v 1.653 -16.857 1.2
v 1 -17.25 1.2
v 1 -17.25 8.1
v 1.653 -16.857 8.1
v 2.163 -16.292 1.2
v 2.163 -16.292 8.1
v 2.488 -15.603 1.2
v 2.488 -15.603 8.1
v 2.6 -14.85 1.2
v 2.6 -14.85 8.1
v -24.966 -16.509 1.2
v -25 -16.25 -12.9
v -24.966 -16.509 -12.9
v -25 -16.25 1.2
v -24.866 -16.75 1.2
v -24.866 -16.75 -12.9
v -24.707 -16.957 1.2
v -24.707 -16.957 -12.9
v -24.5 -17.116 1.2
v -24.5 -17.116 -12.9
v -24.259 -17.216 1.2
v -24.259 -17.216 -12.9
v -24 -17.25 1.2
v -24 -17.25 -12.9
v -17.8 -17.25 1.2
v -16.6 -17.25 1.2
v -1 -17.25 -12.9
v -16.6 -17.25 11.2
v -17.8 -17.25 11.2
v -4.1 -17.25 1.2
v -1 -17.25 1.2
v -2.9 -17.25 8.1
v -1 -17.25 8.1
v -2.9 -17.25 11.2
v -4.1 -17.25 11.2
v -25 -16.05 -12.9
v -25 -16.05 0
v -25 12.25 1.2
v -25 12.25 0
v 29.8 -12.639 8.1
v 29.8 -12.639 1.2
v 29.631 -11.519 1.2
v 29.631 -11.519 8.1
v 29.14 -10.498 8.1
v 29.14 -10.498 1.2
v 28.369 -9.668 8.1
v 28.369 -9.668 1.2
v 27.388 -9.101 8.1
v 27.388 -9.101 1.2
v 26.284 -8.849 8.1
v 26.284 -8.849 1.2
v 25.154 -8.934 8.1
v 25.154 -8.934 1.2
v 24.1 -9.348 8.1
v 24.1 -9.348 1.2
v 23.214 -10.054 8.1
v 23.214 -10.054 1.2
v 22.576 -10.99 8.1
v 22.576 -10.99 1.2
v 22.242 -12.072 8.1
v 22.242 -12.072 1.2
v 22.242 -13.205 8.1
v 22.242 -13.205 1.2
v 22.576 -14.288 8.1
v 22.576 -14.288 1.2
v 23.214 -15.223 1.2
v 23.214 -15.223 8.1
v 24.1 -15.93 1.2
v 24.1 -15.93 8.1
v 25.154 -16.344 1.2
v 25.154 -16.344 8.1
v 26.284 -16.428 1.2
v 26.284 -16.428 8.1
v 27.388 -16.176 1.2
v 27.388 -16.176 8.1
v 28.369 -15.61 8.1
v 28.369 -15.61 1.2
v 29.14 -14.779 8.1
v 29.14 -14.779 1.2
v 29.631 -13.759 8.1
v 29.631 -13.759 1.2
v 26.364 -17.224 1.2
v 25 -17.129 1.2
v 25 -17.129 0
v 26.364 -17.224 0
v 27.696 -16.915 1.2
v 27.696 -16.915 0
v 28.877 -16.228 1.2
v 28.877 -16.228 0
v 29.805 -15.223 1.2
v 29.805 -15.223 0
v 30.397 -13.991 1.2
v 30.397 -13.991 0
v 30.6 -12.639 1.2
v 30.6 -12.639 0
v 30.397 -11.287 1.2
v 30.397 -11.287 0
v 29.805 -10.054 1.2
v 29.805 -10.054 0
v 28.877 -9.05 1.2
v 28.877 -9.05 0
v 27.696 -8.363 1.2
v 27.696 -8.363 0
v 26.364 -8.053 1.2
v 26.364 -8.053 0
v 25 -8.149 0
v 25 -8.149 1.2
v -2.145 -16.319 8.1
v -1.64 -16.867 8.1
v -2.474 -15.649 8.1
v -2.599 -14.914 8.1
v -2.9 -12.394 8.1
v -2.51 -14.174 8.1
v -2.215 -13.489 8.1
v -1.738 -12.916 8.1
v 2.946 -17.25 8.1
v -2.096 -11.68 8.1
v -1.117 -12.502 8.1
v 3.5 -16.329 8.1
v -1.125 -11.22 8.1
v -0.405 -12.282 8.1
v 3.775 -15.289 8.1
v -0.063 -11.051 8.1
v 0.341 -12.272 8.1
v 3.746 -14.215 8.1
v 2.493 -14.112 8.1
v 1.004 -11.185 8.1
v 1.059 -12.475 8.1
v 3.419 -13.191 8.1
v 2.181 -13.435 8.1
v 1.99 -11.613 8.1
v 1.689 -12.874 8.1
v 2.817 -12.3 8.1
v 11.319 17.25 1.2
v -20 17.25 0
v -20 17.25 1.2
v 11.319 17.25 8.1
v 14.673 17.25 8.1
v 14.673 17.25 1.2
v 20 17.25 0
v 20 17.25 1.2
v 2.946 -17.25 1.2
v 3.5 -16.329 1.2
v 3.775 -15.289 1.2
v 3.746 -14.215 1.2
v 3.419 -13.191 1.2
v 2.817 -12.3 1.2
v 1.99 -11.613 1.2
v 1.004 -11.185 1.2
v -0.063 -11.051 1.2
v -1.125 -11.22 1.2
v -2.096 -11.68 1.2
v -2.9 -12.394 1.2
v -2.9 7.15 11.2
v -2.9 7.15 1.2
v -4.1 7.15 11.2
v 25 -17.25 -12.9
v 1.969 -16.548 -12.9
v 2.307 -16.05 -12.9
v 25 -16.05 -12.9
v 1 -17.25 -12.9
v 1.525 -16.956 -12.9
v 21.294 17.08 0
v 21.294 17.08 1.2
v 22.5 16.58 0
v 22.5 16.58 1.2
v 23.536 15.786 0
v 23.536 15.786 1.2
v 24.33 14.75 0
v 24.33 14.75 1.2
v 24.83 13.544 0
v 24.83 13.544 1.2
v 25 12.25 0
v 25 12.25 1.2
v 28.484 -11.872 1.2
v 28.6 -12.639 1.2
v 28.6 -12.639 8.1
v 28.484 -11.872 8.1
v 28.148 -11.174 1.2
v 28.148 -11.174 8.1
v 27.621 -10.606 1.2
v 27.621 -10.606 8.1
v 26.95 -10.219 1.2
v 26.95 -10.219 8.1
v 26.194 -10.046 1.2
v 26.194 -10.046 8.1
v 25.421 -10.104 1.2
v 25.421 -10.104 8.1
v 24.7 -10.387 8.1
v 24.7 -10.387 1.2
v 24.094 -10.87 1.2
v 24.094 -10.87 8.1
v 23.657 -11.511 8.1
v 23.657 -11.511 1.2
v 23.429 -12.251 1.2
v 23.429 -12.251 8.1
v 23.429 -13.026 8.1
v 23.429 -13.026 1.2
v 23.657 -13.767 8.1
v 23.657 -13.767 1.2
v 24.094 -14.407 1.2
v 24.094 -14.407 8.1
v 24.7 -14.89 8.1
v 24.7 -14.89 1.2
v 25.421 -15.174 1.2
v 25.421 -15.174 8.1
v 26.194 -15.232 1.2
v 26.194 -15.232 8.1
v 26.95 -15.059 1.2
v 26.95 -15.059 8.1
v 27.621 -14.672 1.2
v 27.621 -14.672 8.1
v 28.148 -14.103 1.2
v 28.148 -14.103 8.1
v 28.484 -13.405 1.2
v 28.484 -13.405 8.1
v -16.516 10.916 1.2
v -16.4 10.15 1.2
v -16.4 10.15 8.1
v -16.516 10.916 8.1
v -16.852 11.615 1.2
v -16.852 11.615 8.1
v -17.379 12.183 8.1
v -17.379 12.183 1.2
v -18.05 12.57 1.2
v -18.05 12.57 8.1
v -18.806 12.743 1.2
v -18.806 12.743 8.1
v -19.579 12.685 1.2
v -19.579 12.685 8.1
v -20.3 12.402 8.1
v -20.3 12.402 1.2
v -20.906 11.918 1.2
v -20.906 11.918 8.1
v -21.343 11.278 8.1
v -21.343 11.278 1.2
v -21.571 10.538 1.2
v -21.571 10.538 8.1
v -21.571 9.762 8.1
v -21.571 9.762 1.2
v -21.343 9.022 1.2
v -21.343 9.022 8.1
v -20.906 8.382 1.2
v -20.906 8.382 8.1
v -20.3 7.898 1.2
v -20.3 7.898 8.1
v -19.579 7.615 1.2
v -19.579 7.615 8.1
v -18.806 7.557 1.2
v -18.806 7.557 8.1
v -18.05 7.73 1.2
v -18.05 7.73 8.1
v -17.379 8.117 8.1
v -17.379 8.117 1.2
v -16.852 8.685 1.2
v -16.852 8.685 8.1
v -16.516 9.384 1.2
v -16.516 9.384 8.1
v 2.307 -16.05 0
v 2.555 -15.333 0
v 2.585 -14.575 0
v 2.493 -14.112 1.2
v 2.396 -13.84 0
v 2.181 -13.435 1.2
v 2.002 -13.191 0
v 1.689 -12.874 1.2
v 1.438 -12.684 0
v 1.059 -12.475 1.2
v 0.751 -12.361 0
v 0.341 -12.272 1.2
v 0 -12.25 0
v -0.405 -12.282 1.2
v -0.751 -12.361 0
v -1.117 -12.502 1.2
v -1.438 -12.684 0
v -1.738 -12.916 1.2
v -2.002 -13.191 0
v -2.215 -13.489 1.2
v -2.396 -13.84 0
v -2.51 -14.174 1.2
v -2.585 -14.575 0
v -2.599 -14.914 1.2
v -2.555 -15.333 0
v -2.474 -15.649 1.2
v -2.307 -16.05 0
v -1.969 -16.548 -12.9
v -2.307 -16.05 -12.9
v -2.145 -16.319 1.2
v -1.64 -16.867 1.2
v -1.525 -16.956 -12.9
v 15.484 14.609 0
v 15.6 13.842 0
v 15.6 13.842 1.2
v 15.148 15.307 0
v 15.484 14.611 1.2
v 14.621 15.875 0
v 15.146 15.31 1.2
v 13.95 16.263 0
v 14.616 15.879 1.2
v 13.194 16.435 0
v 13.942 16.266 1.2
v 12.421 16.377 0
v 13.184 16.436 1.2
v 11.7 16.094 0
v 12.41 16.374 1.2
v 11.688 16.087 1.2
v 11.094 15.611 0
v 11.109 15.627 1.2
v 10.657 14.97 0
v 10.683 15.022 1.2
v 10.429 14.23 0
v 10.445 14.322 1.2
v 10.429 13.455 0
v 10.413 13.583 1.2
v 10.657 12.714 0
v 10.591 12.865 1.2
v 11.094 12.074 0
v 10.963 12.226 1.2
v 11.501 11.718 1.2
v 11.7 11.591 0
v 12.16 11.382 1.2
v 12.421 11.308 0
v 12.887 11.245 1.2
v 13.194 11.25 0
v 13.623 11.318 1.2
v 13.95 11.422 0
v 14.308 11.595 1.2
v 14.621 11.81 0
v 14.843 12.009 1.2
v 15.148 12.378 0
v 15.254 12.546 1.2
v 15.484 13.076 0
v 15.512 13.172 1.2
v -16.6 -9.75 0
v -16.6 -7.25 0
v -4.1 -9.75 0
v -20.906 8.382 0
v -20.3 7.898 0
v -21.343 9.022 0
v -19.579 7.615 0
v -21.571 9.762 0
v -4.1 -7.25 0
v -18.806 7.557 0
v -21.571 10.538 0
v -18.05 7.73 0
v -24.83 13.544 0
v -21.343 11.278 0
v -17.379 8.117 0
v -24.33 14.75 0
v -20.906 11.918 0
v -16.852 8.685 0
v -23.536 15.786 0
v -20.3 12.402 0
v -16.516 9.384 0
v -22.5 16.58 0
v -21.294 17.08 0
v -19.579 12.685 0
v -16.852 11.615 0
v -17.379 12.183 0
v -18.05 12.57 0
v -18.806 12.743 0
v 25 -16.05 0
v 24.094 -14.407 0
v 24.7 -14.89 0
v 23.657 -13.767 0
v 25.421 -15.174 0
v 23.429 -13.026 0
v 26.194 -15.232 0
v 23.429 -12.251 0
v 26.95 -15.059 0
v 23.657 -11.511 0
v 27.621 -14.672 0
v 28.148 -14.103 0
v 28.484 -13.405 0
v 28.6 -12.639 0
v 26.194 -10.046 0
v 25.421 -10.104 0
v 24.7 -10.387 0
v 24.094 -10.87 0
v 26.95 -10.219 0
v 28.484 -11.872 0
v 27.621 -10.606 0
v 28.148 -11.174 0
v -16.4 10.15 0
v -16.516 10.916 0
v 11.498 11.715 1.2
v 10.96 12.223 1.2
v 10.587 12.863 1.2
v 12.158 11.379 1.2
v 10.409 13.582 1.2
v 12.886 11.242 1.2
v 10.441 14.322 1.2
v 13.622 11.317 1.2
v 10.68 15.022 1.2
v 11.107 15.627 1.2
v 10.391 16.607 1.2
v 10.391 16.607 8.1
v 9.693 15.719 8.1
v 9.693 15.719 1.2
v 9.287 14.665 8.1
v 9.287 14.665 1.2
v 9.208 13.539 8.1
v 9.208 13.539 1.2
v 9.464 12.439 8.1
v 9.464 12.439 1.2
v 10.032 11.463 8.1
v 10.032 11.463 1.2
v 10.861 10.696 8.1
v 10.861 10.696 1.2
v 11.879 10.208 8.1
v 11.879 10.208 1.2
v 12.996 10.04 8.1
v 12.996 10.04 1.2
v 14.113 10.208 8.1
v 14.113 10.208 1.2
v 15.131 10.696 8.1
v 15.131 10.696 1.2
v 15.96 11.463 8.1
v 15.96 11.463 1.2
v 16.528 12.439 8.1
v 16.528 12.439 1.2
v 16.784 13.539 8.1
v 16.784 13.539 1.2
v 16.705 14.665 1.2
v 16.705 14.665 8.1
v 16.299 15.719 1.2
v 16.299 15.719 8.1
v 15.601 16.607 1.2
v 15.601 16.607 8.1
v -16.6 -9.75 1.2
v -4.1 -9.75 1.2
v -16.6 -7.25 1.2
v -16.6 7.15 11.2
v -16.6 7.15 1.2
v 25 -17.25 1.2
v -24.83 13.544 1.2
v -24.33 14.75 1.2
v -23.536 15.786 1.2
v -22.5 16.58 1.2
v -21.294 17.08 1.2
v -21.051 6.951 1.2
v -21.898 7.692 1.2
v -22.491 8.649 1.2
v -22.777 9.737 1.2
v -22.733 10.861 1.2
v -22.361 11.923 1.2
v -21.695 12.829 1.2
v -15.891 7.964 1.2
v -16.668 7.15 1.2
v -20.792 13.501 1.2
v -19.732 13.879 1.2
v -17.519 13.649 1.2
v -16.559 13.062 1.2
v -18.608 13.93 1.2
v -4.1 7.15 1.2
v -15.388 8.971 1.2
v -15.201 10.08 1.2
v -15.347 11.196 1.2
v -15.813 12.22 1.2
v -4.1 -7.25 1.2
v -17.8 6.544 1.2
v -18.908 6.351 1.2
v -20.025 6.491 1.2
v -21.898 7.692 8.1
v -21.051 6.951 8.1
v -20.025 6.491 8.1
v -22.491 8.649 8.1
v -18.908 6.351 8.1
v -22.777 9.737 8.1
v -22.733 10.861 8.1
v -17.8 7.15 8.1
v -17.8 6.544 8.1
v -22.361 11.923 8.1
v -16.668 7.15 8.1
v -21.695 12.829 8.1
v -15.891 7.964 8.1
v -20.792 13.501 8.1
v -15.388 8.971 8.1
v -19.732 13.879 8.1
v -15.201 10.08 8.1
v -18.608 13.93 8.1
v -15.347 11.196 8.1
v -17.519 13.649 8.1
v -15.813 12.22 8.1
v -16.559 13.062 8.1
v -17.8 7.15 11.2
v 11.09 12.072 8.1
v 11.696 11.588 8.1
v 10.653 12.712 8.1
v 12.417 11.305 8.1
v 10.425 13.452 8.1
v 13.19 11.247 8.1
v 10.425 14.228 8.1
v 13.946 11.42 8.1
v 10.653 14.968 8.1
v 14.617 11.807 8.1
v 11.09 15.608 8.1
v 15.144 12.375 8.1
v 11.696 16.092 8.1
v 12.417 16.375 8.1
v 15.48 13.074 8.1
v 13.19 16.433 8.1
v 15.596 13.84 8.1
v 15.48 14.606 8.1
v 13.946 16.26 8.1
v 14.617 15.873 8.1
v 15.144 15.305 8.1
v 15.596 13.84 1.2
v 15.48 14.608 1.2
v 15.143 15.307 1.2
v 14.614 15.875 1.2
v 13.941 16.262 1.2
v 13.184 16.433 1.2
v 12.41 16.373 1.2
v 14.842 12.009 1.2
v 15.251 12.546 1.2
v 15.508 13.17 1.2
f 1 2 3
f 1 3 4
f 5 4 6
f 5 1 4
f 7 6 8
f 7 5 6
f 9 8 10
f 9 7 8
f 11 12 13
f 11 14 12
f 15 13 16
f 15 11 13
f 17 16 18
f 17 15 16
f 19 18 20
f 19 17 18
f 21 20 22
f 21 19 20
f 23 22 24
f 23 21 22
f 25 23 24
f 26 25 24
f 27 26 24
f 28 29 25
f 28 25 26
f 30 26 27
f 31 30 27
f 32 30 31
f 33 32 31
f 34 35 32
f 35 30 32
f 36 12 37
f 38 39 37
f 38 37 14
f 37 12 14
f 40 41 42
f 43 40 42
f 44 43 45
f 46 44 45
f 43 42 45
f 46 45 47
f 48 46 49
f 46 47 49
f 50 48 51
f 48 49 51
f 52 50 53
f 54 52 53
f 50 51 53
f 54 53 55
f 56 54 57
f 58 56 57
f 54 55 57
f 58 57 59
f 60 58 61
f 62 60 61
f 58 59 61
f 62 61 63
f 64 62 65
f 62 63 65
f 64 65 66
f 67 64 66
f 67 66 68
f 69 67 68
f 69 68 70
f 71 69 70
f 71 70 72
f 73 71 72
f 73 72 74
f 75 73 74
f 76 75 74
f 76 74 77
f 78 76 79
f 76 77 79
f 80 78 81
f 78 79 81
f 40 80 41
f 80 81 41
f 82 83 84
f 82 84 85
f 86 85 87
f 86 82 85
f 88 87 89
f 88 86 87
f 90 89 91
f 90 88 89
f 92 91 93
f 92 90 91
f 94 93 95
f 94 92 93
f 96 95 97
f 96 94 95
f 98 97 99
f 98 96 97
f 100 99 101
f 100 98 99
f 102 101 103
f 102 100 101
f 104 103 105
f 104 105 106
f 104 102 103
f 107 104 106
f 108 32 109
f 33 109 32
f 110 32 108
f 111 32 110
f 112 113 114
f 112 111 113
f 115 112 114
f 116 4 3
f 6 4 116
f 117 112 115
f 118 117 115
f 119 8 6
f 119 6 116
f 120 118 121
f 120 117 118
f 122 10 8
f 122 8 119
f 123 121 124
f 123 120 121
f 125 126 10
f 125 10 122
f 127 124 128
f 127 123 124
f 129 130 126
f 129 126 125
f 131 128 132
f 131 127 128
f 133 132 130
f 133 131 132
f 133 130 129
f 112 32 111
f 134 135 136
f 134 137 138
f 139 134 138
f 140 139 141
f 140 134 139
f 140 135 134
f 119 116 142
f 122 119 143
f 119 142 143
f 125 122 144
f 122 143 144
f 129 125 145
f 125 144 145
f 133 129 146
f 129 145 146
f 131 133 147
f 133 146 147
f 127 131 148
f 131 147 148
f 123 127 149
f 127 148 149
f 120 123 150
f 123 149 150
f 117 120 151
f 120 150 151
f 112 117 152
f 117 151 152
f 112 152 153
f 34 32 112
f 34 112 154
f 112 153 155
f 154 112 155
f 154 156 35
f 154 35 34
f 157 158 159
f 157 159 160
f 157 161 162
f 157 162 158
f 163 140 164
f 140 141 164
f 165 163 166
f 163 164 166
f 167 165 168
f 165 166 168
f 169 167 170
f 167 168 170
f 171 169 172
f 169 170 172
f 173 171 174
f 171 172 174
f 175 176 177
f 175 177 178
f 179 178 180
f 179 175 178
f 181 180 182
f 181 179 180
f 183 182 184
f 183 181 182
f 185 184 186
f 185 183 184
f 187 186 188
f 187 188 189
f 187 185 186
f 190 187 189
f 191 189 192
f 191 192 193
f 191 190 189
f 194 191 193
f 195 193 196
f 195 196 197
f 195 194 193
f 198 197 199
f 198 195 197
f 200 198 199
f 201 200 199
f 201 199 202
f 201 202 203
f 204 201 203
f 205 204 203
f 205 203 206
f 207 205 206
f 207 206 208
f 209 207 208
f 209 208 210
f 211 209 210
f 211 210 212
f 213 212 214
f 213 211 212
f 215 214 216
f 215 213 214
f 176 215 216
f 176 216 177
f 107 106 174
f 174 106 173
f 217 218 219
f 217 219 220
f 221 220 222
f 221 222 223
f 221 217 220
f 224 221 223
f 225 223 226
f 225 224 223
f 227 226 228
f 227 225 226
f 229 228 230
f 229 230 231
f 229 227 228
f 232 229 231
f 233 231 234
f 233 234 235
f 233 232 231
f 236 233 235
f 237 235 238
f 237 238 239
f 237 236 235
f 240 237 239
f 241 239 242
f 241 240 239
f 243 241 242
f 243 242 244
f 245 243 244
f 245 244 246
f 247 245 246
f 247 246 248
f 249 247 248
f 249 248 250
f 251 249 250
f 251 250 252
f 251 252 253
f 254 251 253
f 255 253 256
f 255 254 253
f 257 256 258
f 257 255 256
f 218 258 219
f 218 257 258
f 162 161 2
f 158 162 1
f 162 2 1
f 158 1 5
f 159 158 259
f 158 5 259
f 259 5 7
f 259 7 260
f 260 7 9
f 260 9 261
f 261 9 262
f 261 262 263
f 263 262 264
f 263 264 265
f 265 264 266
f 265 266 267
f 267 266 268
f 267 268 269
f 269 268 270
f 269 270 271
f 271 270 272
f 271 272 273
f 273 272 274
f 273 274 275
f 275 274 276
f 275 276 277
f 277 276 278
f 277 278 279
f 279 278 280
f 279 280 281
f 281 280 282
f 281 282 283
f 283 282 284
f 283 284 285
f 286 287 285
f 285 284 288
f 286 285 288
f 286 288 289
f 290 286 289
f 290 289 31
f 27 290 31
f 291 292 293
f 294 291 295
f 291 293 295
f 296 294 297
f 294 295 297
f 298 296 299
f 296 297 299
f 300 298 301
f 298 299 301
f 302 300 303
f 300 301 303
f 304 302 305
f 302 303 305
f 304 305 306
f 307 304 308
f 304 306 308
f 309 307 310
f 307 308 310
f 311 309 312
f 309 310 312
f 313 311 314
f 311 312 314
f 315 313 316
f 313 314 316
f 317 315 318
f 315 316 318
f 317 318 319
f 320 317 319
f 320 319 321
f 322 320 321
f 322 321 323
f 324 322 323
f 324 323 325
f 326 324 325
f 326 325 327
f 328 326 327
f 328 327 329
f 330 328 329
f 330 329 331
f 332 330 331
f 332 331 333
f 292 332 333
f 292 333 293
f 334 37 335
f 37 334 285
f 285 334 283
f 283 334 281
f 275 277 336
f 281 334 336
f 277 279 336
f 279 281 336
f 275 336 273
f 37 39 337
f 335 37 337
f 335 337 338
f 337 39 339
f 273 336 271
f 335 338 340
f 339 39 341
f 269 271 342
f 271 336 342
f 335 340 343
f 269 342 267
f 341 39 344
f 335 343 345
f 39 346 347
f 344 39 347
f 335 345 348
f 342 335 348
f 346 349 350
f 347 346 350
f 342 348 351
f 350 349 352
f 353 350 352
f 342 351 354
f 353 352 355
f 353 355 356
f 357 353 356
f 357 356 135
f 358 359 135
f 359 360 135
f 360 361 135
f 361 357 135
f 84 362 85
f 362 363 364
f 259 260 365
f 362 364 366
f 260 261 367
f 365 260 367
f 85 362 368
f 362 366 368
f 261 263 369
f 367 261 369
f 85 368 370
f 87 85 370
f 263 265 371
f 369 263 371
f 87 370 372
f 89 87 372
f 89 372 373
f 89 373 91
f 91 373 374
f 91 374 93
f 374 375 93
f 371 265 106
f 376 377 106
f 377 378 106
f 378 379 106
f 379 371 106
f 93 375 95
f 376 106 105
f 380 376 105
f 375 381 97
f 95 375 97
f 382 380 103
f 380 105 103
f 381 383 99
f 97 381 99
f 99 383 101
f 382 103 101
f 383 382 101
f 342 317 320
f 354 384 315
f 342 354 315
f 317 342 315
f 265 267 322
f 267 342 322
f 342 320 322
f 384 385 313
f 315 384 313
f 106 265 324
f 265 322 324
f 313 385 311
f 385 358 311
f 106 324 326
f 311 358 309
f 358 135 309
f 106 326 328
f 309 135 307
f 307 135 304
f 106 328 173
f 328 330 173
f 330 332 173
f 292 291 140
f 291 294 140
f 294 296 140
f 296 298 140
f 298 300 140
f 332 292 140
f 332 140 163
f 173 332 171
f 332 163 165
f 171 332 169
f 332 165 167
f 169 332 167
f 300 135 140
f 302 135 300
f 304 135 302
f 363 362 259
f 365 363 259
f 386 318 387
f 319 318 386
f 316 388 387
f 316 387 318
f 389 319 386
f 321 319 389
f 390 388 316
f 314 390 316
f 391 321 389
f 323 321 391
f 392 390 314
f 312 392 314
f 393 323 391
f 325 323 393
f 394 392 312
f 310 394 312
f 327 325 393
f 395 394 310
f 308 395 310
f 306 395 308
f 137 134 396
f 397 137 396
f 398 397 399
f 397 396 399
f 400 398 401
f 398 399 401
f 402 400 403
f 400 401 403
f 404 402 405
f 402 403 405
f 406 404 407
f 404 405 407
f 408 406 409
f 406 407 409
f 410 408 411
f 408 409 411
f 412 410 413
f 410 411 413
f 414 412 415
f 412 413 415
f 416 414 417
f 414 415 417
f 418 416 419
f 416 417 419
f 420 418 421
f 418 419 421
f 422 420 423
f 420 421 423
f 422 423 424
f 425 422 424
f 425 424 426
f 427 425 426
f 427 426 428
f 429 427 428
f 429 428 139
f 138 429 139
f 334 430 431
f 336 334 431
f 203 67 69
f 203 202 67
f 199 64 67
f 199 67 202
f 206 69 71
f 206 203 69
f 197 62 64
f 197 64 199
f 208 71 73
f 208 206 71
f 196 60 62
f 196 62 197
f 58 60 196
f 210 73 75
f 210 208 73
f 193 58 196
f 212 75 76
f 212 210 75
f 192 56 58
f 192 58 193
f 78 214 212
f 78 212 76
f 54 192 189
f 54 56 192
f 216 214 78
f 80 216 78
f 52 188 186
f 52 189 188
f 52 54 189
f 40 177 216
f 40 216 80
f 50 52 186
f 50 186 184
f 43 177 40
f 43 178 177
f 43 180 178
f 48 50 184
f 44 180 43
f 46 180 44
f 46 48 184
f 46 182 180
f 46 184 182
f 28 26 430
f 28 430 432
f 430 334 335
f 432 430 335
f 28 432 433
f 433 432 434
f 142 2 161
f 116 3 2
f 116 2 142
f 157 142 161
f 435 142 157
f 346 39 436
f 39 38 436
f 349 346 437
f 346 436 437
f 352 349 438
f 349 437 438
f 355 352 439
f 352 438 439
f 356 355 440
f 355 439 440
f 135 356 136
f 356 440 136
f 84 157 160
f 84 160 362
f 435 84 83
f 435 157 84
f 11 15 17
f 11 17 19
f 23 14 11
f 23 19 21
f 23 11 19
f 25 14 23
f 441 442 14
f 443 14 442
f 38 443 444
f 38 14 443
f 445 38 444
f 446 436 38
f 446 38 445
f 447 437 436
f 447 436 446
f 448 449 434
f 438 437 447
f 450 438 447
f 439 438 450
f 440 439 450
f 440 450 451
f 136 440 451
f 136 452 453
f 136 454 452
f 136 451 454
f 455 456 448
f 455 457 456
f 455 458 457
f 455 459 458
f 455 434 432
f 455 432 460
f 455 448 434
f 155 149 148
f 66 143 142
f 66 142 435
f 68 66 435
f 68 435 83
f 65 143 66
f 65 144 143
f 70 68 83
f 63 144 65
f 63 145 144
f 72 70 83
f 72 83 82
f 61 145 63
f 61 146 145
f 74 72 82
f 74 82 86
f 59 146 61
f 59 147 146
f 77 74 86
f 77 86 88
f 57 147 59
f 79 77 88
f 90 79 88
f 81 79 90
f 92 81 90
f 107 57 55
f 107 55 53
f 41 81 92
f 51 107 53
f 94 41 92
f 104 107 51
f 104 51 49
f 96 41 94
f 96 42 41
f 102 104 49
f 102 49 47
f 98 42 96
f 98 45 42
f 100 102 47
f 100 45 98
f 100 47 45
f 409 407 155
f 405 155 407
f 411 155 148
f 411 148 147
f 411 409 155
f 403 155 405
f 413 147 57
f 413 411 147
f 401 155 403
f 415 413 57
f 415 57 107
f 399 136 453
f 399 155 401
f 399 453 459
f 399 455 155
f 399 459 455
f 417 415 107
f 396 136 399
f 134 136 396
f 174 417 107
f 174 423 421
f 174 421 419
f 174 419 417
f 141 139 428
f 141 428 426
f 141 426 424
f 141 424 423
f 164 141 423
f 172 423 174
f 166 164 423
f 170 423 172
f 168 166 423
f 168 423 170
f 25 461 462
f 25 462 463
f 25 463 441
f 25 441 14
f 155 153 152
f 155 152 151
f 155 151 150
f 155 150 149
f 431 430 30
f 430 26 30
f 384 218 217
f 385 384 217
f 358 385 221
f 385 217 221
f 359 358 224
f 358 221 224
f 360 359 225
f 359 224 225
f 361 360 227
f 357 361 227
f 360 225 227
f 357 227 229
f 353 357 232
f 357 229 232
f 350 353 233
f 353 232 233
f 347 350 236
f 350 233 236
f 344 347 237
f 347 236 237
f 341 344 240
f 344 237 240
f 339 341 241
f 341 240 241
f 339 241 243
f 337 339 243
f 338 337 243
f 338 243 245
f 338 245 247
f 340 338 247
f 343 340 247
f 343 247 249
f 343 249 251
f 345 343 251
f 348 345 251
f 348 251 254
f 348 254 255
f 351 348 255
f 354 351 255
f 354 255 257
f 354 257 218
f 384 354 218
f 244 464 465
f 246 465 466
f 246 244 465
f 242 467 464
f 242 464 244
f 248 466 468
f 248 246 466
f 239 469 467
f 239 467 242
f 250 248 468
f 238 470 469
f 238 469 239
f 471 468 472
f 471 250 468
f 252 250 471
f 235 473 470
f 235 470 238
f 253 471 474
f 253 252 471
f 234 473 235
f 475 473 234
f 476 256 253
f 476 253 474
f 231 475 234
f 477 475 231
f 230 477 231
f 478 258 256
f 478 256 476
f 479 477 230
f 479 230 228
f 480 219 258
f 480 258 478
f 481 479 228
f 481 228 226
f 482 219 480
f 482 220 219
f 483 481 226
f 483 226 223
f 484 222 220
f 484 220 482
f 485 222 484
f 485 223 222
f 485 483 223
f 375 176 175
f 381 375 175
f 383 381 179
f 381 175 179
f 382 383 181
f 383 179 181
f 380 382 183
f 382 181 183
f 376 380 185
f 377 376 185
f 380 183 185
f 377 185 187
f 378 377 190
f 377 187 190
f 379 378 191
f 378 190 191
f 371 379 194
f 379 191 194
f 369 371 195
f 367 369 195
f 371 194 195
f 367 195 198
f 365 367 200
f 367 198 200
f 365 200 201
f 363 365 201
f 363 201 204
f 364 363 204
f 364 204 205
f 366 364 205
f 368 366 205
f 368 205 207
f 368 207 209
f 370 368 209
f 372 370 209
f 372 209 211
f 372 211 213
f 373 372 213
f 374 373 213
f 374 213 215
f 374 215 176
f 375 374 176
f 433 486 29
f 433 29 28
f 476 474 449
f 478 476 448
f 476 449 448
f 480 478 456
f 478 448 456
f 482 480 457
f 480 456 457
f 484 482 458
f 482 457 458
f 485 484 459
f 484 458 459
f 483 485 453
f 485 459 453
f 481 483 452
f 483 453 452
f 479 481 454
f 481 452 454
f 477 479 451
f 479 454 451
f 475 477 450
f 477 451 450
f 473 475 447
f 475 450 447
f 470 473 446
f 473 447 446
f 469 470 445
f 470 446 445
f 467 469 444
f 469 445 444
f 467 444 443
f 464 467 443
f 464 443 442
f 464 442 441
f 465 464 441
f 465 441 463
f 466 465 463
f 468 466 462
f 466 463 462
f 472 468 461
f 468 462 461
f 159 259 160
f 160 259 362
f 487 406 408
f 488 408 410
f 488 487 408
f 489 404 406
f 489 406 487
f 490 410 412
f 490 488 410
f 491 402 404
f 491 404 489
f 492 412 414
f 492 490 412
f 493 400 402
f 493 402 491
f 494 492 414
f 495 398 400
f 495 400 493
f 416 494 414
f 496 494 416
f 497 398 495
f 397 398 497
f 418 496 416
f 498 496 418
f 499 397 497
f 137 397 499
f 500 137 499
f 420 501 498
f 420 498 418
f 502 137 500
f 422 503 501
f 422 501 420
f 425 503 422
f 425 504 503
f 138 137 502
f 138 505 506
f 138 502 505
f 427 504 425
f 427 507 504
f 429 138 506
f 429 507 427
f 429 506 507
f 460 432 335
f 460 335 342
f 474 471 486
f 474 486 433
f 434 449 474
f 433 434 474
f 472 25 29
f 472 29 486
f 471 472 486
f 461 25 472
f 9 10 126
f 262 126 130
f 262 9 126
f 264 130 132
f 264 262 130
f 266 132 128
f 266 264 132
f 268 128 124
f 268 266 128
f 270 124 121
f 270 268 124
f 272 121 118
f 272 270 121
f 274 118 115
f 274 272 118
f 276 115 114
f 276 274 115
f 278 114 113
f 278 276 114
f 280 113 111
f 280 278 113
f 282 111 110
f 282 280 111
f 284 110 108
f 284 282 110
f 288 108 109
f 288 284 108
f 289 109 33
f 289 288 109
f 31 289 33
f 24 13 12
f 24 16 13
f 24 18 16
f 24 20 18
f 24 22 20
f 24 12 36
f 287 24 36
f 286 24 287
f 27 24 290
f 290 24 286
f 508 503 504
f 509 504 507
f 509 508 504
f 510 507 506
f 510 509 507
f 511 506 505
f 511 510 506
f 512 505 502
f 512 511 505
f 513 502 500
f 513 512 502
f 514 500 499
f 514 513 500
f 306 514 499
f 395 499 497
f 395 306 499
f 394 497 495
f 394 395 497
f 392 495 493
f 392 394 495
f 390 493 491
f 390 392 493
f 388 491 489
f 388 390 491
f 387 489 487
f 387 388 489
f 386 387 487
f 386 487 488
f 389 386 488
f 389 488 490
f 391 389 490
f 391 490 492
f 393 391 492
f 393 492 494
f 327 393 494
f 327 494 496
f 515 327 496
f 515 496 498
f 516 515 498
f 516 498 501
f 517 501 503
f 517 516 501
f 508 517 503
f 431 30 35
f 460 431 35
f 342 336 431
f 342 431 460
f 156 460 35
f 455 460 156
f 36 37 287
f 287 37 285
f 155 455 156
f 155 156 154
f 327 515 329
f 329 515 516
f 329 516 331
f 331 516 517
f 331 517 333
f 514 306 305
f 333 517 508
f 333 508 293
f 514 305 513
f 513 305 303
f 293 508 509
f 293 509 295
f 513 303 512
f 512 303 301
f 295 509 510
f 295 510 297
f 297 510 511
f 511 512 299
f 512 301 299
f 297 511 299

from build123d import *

# Parameters (mm, degrees)
SKETCH_W        = 50
SKETCH_H        = 34.5
PAD_DEPTH       = 1.2
SKETCH001_R     = 2.6
POCKET_DEPTH    = 1.201
SKETCH002_W     = 1.2
SKETCH002_H     = 24.4
PAD001_DEPTH    = 10
SKETCH003_W     = 50
SKETCH003_H     = 14.1
PAD002_DEPTH    = 1.2
SKETCH004_R     = 2.6
SKETCH004_W     = 12.5
SKETCH004_H     = 2.5
POCKET001_DEPTH = 14.101
SKETCH005_R     = 4.6
SKETCH005_R_2   = 2.6
PAD003_DEPTH    = 1.2
FILLET_R        = 1
FILLET001_R     = 5
SKETCH006_R     = 3.8
SKETCH006_R_2   = 2.6
PAD004_DEPTH    = 6.9
SKETCH007_W     = 9
SKETCH007_H     = 2
SKETCH007_W_2   = 3.353744
SKETCH007_H_2   = 0.7
POCKET002_DEPTH = 10


with BuildPart() as part:
    # Sketch → Pad (new body)
    with BuildSketch(Plane.XY):
        Rectangle(SKETCH_W, SKETCH_H)
    extrude(amount=PAD_DEPTH)

    # Sketch001 (on Face6 of Pad) → Pocket (cut, through all)
    with BuildSketch(Plane.XY.offset(1.2)):
        with Locations((0, -14.85)):
            Circle(SKETCH001_R)
        with Locations((-19, 10.15)):
            Circle(SKETCH001_R)
        with Locations((13, 13.842333)):
            Circle(SKETCH001_R)
        with Locations((26, -12.638792)):
            Circle(SKETCH001_R)
    extrude(amount=-POCKET_DEPTH, mode=Mode.SUBTRACT)

    # Sketch002 (on Face5 of Pocket) → Pad001 (join)
    with BuildSketch(Plane.XY.offset(1.2)):
        with Locations((-3.5, -5.05)):
            Rectangle(SKETCH002_W, SKETCH002_H)
        with Locations((-17.2, -5.05)):
            Rectangle(SKETCH002_W, SKETCH002_H)
    extrude(amount=PAD001_DEPTH)

    # Sketch003 (on Face6 of Pad001) → Pad002 (join)
    with BuildSketch(Plane.XZ.offset(17.25)):
        with Locations((0, -5.85)):
            Rectangle(SKETCH003_W, SKETCH003_H)
    extrude(amount=-PAD002_DEPTH)

    # Sketch004 (on Face5 of Pad002) → Pocket001 (cut, through all)
    with BuildSketch(Plane.XY.offset(1.2)):
        with Locations((0, -14.85)):
            Circle(SKETCH004_R)
        with Locations((-10.35, -8.5)):
            Rectangle(SKETCH004_W, SKETCH004_H)
    extrude(amount=-POCKET001_DEPTH, mode=Mode.SUBTRACT)

    # Sketch005 (on Face5 of Pocket001) → Pad003 (join)
    with BuildSketch(Plane.XY.offset(1.2)):
        with Locations((26, -12.638792)):
            Circle(SKETCH005_R)
        with Locations((26, -12.638792)):
            Circle(SKETCH005_R_2, mode=Mode.SUBTRACT)
    extrude(amount=-PAD003_DEPTH)

    # Fillet
    fillet_edges = [part.edges().sort_by_distance(p)[0] for p in [
        (-25, -17.25, -6.45),
        (-25, -17.25, 0.6),
    ]]
    fillet(fillet_edges, radius=FILLET_R)

    # Fillet001
    fillet001_edges = [part.edges().sort_by_distance(p)[0] for p in [
        (-25, 17.25, 0.6),
        (25, 17.25, 0.6),
    ]]
    fillet(fillet001_edges, radius=FILLET001_R)

    # Sketch006 (on Face5 of Fillet001) → Pad004 (join)
    with BuildSketch(Plane.XY.offset(1.2)):
        with Locations((-19, 10.15)):
            Circle(SKETCH006_R)
        with Locations((-19, 10.15)):
            Circle(SKETCH006_R_2, mode=Mode.SUBTRACT)
        with Locations((12.996001, 13.84)):
            Circle(SKETCH006_R)
        with Locations((12.996001, 13.84)):
            Circle(SKETCH006_R_2, mode=Mode.SUBTRACT)
        with Locations((26, -12.638792)):
            Circle(SKETCH006_R)
        with Locations((26, -12.638792)):
            Circle(SKETCH006_R_2, mode=Mode.SUBTRACT)
        with Locations((0, -14.85)):
            Circle(SKETCH006_R)
        with Locations((0, -14.85)):
            Circle(SKETCH006_R_2, mode=Mode.SUBTRACT)
    extrude(amount=PAD004_DEPTH)

    # Sketch007 (on Face5 of Pad004) → Pocket002 (cut)
    with BuildSketch(Plane.XY.offset(1.2)):
        with Locations((0.4, -18.25)):
            Rectangle(SKETCH007_W, SKETCH007_H)
        with Locations((12.996001, 17.6)):
            Rectangle(SKETCH007_W_2, SKETCH007_H_2)
    extrude(amount=POCKET002_DEPTH, mode=Mode.SUBTRACT)


solid = part.part
